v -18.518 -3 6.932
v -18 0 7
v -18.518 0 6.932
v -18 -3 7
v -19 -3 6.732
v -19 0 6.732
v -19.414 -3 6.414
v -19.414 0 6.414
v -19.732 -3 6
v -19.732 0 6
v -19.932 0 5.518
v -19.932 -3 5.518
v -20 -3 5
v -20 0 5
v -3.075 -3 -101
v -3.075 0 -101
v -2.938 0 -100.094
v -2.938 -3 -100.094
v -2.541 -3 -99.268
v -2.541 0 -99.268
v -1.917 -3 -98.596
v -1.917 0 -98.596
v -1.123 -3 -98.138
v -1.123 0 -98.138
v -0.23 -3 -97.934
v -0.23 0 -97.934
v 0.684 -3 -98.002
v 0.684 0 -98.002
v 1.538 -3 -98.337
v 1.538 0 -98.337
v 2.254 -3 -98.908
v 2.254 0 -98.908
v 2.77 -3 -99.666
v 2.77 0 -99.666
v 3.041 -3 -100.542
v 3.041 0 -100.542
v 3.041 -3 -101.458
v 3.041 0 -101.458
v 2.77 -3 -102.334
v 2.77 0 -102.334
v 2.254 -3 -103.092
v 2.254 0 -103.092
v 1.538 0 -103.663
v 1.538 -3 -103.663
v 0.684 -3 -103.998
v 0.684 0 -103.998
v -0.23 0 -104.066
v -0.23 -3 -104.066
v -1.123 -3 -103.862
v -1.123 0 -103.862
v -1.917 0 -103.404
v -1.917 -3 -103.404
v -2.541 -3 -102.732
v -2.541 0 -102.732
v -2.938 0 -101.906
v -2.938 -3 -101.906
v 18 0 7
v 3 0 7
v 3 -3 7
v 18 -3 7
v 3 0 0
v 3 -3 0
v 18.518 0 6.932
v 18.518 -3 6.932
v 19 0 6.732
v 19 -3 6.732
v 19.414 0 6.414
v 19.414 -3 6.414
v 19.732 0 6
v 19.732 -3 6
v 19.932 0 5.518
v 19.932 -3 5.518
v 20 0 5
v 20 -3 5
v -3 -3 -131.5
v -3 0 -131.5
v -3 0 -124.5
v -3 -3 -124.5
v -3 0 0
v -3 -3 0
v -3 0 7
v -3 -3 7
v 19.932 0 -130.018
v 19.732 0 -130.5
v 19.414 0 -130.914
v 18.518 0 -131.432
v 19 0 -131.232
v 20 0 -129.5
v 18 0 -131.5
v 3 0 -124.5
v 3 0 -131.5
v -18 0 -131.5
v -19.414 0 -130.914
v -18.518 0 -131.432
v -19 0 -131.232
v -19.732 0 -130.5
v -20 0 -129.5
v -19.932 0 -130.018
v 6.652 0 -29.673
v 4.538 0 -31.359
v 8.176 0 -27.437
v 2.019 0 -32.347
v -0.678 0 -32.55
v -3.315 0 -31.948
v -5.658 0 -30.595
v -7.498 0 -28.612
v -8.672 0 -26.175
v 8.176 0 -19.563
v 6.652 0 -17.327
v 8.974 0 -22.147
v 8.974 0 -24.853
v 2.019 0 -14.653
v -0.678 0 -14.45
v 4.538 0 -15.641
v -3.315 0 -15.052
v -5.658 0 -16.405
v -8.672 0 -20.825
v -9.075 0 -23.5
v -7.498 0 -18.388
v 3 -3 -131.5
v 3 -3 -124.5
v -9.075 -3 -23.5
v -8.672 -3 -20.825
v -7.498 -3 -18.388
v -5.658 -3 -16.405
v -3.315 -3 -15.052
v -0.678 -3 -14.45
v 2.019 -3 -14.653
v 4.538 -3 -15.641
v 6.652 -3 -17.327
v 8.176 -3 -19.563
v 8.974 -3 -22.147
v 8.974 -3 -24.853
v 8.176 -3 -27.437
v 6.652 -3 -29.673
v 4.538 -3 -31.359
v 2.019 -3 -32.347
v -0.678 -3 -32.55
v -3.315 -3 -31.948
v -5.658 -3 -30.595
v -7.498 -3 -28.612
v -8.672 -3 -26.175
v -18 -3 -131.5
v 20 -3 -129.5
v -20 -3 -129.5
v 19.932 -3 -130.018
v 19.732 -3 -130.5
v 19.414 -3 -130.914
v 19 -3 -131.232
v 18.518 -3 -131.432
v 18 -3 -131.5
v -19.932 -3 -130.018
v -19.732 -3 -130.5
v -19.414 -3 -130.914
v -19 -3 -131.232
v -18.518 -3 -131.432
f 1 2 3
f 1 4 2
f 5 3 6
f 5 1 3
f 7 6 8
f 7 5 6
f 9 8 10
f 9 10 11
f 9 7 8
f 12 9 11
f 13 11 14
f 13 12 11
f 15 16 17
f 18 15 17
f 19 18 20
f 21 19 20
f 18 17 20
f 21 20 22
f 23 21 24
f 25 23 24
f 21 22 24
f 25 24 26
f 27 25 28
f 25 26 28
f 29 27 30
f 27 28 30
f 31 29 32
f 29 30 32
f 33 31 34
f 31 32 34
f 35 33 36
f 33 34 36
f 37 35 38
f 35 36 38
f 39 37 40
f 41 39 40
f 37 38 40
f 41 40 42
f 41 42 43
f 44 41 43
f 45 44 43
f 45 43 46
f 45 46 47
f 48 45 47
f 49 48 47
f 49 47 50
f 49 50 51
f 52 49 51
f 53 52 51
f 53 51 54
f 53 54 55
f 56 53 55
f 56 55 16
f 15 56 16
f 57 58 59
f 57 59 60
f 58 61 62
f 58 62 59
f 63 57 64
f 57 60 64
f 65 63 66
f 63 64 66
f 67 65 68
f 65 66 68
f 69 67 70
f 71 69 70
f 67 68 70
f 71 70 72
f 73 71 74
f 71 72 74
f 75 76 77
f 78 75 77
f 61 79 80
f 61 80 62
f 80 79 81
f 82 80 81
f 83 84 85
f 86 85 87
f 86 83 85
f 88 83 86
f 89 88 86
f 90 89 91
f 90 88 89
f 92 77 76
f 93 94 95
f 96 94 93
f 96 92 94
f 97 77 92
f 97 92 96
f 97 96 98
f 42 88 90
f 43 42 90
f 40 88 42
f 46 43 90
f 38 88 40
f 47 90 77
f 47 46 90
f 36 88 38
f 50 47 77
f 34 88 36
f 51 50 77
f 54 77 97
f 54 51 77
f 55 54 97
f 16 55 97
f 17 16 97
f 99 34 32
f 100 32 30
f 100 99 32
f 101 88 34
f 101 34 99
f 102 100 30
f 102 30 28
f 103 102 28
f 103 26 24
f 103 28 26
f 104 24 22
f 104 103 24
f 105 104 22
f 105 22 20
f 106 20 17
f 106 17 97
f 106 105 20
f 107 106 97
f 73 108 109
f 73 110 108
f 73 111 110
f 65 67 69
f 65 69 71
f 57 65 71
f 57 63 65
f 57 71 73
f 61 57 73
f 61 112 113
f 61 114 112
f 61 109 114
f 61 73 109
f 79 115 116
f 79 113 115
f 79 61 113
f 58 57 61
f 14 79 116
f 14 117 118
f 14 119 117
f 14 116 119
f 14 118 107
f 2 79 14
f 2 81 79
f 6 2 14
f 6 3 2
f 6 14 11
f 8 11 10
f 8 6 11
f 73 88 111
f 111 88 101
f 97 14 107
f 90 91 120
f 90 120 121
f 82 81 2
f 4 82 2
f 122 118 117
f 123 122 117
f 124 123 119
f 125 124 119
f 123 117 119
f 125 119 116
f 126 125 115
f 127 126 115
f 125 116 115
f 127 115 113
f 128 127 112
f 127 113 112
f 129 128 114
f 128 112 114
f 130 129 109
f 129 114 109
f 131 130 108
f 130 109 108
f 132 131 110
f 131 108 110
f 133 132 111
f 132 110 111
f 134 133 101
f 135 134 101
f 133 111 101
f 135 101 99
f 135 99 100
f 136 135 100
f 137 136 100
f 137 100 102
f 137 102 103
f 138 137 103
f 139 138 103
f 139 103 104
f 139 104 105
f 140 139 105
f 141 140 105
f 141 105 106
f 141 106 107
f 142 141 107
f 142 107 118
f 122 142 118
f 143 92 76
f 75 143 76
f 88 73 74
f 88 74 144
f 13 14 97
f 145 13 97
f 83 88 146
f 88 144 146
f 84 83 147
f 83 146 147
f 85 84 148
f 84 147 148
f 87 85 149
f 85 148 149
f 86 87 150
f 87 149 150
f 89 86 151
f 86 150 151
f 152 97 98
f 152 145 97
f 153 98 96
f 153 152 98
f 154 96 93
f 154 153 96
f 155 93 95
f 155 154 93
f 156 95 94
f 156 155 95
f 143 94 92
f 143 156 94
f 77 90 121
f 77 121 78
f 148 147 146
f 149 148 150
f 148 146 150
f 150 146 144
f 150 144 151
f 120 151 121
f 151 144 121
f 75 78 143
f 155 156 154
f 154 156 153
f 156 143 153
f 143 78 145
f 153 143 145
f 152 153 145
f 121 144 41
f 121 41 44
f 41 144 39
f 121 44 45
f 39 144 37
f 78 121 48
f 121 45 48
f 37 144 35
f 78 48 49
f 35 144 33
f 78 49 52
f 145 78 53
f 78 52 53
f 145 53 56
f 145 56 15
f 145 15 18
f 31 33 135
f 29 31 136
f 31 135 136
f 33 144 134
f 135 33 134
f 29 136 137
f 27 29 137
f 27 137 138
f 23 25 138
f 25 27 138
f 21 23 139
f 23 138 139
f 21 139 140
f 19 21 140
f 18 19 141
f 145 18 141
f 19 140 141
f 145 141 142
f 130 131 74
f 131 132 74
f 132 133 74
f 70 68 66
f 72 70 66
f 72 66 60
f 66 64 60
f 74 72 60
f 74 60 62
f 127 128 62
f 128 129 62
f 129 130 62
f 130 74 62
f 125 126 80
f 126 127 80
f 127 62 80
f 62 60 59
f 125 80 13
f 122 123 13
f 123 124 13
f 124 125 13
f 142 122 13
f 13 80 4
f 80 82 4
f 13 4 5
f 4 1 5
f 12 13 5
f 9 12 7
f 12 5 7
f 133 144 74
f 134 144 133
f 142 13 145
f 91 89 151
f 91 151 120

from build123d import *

# Parameters (mm, degrees)
F1_DEPTH = 3
F4_D     = 18.15
F6_D     = 6.15
F7_R     = 2


with BuildPart() as f1:
    # F0 (on Front) → F1 (new body)
    with BuildSketch(Plane.XZ):
        Polygon((0, -124.5), (0, 0), (-3, 0), (-3, 7), (-20, 7), (-20, -131.5), (-3, -131.5), (-3, -124.5), align=None)
    extrude(amount=F1_DEPTH)

    # F2: F1 across plane


with BuildPart() as f1_1:
    add(f1.part)
    add(f1.part.mirror(Plane.YZ))

    # F4 (through all)
    with Locations(Plane.XZ.offset(3)):
        with Locations((0, -23.5)):
            Hole(F4_D / 2)

    # F6 (through all)
    with Locations(Plane.XZ.offset(3)):
        with Locations((0, -101)):
            Hole(F6_D / 2)

    # F7
    f7_edges = [f1_1.edges().sort_by_distance(p)[0] for p in [
        (20, -1.5, -131.5),
        (-20, -1.5, -131.5),
        (-20, -1.5, 7),
        (20, -1.5, 7),
    ]]
    fillet(f7_edges, radius=F7_R)


solid = f1_1.part
